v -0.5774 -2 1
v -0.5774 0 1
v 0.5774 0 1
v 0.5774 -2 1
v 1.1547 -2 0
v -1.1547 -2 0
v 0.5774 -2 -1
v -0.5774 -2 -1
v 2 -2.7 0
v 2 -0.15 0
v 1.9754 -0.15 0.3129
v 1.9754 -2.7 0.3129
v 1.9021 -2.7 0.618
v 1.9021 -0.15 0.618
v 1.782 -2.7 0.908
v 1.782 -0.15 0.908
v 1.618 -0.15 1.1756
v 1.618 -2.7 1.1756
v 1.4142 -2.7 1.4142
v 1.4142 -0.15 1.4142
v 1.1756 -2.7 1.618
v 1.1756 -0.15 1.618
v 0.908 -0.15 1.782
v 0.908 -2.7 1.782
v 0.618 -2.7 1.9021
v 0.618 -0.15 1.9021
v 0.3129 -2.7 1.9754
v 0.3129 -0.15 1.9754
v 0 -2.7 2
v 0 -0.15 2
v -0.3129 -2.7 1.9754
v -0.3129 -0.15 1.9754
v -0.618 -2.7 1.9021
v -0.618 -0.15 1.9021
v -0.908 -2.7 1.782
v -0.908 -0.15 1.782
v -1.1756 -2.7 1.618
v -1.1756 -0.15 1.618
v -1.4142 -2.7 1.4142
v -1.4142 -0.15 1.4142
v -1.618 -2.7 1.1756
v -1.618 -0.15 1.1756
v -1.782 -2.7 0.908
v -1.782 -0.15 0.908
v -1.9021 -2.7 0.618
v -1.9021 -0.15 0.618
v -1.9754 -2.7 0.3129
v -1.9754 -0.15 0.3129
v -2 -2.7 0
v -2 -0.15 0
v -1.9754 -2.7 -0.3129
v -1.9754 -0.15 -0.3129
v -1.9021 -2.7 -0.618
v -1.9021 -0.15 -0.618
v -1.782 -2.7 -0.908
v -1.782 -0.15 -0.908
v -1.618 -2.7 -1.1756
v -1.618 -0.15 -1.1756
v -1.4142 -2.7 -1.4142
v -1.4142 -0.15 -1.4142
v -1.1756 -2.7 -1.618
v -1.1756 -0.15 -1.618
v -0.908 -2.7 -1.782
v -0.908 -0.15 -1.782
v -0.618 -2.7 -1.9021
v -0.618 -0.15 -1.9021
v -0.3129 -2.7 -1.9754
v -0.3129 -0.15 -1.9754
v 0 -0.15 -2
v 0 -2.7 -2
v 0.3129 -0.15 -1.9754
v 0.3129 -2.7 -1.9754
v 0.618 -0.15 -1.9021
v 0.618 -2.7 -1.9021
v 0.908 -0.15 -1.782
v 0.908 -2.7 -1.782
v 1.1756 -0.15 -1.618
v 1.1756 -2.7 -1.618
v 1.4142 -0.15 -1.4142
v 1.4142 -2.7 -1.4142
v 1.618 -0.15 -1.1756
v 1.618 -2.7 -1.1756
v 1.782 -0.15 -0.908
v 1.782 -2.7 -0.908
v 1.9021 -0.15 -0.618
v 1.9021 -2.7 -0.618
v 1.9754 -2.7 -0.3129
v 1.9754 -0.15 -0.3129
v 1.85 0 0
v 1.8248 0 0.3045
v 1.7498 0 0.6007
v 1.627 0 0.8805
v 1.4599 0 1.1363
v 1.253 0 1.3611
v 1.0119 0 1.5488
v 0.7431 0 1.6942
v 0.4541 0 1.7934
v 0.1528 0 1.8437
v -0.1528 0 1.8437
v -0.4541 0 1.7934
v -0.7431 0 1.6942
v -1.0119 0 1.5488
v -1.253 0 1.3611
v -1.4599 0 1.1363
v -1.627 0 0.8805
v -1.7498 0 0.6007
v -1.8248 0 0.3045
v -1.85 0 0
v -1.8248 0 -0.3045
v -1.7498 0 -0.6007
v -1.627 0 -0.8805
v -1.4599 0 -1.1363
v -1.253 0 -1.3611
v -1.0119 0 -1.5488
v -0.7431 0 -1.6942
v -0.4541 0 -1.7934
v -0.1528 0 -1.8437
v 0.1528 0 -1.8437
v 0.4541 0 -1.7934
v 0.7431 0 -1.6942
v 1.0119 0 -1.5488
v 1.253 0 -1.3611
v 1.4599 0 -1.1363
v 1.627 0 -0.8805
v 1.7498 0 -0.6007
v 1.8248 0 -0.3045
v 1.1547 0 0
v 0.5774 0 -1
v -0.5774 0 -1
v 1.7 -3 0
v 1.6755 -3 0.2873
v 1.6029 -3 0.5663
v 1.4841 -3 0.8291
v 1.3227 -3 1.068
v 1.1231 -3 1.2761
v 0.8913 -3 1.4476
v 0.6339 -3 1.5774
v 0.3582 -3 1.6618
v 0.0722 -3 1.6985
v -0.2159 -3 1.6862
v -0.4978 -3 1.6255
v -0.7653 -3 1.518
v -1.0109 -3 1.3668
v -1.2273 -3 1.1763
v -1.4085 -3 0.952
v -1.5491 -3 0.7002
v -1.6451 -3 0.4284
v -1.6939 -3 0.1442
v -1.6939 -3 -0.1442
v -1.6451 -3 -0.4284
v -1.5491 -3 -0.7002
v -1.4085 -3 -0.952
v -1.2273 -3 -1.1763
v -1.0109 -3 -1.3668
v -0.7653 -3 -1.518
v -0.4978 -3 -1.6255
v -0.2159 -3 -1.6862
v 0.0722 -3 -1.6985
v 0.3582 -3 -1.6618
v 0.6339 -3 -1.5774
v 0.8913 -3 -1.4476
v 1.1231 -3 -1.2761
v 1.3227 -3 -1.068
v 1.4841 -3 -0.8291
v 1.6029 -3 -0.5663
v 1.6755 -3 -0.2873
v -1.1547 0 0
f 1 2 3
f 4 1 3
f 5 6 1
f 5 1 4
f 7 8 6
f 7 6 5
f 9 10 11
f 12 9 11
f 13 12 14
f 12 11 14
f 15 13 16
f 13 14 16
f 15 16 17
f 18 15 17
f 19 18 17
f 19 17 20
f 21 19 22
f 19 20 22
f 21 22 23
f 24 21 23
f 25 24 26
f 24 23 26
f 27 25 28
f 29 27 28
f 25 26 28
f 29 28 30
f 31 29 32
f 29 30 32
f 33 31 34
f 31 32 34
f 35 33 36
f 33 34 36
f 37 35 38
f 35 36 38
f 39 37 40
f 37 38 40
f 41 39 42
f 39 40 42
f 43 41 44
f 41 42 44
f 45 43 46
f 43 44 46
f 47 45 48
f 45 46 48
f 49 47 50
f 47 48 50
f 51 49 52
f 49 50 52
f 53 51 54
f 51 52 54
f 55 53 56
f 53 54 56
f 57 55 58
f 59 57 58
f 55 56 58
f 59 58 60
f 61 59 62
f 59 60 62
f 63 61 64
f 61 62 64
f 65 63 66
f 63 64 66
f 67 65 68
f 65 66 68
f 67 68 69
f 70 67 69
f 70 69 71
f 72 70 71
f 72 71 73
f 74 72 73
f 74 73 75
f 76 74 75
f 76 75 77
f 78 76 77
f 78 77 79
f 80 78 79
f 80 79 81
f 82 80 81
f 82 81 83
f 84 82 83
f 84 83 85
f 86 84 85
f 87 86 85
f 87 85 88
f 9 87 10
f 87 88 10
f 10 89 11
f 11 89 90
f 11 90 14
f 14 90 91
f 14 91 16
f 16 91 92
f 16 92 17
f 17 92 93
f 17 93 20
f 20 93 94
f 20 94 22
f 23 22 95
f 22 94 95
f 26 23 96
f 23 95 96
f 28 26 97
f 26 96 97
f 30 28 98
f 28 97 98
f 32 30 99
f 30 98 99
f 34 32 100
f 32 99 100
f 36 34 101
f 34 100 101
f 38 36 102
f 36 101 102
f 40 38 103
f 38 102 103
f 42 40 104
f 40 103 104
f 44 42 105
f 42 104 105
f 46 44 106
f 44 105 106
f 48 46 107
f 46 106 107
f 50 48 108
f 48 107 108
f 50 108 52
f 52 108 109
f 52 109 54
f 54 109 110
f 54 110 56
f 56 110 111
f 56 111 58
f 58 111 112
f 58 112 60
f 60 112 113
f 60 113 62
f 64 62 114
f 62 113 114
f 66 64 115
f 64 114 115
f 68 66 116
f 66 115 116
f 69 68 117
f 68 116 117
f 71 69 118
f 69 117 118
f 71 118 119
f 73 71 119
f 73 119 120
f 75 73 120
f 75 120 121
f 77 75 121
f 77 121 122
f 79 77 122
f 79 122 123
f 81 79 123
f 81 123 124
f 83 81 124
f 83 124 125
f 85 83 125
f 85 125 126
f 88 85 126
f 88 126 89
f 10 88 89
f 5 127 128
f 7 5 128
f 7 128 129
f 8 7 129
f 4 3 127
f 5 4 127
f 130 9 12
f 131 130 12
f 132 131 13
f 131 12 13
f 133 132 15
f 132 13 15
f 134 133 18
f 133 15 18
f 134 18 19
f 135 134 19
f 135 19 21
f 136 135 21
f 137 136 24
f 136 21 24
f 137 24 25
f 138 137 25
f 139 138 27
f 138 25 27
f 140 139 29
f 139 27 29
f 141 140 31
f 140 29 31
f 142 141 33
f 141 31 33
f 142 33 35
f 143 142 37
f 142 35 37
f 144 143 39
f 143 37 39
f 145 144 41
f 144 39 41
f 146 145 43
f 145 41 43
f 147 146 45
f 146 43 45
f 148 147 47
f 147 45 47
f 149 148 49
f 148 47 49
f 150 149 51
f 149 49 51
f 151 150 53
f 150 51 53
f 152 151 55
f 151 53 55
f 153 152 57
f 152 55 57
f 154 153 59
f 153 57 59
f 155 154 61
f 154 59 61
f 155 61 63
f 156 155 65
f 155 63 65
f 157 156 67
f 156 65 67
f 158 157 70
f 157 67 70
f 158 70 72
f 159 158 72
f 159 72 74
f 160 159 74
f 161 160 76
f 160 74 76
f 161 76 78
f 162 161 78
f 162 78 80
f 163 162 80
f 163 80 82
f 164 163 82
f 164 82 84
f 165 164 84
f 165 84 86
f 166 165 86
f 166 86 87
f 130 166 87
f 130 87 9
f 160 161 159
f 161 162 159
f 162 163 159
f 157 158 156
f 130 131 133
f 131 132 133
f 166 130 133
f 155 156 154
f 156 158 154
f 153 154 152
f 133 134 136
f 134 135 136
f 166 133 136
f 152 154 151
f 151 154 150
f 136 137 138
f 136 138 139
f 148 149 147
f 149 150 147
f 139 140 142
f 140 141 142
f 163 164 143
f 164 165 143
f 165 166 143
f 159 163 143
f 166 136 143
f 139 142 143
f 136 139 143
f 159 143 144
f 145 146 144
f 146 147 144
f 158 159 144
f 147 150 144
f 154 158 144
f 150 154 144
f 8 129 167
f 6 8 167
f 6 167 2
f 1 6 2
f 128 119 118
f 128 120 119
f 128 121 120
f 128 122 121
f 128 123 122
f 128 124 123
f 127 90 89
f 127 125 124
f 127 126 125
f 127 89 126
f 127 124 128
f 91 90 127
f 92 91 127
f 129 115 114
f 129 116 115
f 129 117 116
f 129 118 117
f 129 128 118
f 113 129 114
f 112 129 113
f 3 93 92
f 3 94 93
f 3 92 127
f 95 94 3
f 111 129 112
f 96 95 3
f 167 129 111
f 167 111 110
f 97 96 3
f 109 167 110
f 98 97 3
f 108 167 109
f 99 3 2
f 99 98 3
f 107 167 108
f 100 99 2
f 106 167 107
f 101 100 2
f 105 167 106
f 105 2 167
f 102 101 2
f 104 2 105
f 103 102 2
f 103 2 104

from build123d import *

# Parameters (mm, degrees)
CROQUIS1_W            = 2
CROQUIS1_H            = 3
CORTAR_EXTRUIR2_DEPTH = 2
CHAFL_N3_SIZE         = 0.3
CHAFL_N4_SIZE         = 0.15


with BuildPart() as part:
    # Croquis1 → Revolución1 (revolve)
    with BuildSketch(Plane.XY):
        with Locations((1, -1.5)):
            Rectangle(CROQUIS1_W, CROQUIS1_H)
    revolve(axis=Axis((0, 0, 0), (0, -1, 0)))

    # Croquis3 → Cortar-Extruir2 (cut)
    with BuildSketch(Plane(origin=(0, 0, 0), x_dir=(1, 0, 0), z_dir=(0, 1, 0))):
        Polygon((-0.577350269, 1), (-1.154700538, 0), (-0.577350269, -1), (0.577350269, -1), (1.154700538, 0), (0.577350269, 1), align=None)
    extrude(amount=-CORTAR_EXTRUIR2_DEPTH, mode=Mode.SUBTRACT)

    # Chaflán3
    chafl_n3_edges = [part.edges().sort_by_distance(p)[0] for p in [
        (-2, -3, 0),
    ]]
    chamfer(chafl_n3_edges, length=CHAFL_N3_SIZE)

    # Chaflán4
    chafl_n4_edges = [part.edges().sort_by_distance(p)[0] for p in [
        (-2, 0, 0),
    ]]
    chamfer(chafl_n4_edges, length=CHAFL_N4_SIZE)


solid = part.part
